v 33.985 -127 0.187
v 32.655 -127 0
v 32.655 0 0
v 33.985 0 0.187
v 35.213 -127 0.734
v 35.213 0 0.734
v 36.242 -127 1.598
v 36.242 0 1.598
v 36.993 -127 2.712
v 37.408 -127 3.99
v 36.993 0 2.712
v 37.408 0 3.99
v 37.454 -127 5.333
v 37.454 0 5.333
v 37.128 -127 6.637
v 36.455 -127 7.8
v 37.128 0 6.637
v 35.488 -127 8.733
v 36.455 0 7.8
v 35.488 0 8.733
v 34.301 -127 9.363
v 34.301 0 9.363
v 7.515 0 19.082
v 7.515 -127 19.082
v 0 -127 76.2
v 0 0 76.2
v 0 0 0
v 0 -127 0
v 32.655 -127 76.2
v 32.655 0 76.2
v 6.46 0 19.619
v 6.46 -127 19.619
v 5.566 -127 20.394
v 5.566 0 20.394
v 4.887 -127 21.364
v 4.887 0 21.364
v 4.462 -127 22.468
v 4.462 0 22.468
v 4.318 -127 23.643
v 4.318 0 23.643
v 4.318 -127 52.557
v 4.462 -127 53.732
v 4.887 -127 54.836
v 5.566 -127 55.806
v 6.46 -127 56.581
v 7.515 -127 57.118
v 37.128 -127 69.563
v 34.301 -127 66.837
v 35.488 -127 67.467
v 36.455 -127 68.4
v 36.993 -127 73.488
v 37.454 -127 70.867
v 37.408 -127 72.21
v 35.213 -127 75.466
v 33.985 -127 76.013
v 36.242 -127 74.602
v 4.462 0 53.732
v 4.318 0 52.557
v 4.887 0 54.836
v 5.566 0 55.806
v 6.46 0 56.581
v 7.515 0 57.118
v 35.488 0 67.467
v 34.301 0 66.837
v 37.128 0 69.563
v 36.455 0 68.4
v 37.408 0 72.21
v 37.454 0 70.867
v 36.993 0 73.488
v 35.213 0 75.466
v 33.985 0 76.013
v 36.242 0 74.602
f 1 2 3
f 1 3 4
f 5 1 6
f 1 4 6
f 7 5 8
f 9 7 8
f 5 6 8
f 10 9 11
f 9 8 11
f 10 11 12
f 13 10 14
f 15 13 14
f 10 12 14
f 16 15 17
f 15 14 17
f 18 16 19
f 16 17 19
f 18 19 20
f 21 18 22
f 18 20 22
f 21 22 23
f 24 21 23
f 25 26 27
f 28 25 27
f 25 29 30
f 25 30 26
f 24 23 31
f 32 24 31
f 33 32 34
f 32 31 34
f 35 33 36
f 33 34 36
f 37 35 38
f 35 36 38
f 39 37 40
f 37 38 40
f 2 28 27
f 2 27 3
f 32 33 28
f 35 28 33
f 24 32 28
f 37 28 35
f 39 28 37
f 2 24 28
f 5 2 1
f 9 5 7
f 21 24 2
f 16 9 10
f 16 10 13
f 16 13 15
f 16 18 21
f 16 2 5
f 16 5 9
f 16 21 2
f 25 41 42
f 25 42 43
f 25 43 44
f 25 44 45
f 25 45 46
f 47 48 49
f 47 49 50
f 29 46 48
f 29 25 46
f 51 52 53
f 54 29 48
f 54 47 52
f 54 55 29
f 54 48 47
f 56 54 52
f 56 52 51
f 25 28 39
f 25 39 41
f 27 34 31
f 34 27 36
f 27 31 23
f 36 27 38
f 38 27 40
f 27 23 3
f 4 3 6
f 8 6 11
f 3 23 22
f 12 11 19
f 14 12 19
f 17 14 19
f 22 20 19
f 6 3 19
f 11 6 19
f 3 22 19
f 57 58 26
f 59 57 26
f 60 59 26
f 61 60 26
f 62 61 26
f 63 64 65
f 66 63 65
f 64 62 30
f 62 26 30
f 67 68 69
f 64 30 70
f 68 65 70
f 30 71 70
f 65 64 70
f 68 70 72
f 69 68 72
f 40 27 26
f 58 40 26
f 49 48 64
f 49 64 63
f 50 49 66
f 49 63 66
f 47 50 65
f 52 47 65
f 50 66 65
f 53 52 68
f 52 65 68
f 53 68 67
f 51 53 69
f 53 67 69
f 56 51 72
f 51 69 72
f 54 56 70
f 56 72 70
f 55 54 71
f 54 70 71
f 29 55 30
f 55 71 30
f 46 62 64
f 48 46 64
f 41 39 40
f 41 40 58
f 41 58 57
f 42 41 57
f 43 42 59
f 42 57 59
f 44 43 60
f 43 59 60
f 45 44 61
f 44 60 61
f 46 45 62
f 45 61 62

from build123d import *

# Parameters (mm, degrees)
F1_DEPTH = 127


with BuildPart() as f1:
    # F0 (on Front) → F1 (new body)
    with BuildSketch(Plane.XZ):
        with BuildLine():
            Line((0, 38.1), (0, 0))
            Line((0, 0), (32.654806, 0))
            ThreePointArc((32.654806, 0), (37.407898, 3.990299), (34.300957, 9.36257))
            Line((34.300957, 9.36257), (7.514585, 19.082338))
            ThreePointArc((7.514585, 19.082338), (5.196728, 20.858192), (4.318, 23.642784))
            Line((4.318, 23.642784), (4.318, 38.1))
            Line((4.318, 38.1), (4.318, 52.557216))
            ThreePointArc((4.318, 52.557216), (5.196728, 55.341808), (7.514585, 57.117662))
            Line((7.514585, 57.117662), (34.300957, 66.83743))
            ThreePointArc((34.300957, 66.83743), (37.407898, 72.209701), (32.654806, 76.2))
            Line((32.654806, 76.2), (0, 76.2))
            Line((0, 76.2), (0, 38.1))
        make_face()
    extrude(amount=F1_DEPTH)


solid = f1.part
